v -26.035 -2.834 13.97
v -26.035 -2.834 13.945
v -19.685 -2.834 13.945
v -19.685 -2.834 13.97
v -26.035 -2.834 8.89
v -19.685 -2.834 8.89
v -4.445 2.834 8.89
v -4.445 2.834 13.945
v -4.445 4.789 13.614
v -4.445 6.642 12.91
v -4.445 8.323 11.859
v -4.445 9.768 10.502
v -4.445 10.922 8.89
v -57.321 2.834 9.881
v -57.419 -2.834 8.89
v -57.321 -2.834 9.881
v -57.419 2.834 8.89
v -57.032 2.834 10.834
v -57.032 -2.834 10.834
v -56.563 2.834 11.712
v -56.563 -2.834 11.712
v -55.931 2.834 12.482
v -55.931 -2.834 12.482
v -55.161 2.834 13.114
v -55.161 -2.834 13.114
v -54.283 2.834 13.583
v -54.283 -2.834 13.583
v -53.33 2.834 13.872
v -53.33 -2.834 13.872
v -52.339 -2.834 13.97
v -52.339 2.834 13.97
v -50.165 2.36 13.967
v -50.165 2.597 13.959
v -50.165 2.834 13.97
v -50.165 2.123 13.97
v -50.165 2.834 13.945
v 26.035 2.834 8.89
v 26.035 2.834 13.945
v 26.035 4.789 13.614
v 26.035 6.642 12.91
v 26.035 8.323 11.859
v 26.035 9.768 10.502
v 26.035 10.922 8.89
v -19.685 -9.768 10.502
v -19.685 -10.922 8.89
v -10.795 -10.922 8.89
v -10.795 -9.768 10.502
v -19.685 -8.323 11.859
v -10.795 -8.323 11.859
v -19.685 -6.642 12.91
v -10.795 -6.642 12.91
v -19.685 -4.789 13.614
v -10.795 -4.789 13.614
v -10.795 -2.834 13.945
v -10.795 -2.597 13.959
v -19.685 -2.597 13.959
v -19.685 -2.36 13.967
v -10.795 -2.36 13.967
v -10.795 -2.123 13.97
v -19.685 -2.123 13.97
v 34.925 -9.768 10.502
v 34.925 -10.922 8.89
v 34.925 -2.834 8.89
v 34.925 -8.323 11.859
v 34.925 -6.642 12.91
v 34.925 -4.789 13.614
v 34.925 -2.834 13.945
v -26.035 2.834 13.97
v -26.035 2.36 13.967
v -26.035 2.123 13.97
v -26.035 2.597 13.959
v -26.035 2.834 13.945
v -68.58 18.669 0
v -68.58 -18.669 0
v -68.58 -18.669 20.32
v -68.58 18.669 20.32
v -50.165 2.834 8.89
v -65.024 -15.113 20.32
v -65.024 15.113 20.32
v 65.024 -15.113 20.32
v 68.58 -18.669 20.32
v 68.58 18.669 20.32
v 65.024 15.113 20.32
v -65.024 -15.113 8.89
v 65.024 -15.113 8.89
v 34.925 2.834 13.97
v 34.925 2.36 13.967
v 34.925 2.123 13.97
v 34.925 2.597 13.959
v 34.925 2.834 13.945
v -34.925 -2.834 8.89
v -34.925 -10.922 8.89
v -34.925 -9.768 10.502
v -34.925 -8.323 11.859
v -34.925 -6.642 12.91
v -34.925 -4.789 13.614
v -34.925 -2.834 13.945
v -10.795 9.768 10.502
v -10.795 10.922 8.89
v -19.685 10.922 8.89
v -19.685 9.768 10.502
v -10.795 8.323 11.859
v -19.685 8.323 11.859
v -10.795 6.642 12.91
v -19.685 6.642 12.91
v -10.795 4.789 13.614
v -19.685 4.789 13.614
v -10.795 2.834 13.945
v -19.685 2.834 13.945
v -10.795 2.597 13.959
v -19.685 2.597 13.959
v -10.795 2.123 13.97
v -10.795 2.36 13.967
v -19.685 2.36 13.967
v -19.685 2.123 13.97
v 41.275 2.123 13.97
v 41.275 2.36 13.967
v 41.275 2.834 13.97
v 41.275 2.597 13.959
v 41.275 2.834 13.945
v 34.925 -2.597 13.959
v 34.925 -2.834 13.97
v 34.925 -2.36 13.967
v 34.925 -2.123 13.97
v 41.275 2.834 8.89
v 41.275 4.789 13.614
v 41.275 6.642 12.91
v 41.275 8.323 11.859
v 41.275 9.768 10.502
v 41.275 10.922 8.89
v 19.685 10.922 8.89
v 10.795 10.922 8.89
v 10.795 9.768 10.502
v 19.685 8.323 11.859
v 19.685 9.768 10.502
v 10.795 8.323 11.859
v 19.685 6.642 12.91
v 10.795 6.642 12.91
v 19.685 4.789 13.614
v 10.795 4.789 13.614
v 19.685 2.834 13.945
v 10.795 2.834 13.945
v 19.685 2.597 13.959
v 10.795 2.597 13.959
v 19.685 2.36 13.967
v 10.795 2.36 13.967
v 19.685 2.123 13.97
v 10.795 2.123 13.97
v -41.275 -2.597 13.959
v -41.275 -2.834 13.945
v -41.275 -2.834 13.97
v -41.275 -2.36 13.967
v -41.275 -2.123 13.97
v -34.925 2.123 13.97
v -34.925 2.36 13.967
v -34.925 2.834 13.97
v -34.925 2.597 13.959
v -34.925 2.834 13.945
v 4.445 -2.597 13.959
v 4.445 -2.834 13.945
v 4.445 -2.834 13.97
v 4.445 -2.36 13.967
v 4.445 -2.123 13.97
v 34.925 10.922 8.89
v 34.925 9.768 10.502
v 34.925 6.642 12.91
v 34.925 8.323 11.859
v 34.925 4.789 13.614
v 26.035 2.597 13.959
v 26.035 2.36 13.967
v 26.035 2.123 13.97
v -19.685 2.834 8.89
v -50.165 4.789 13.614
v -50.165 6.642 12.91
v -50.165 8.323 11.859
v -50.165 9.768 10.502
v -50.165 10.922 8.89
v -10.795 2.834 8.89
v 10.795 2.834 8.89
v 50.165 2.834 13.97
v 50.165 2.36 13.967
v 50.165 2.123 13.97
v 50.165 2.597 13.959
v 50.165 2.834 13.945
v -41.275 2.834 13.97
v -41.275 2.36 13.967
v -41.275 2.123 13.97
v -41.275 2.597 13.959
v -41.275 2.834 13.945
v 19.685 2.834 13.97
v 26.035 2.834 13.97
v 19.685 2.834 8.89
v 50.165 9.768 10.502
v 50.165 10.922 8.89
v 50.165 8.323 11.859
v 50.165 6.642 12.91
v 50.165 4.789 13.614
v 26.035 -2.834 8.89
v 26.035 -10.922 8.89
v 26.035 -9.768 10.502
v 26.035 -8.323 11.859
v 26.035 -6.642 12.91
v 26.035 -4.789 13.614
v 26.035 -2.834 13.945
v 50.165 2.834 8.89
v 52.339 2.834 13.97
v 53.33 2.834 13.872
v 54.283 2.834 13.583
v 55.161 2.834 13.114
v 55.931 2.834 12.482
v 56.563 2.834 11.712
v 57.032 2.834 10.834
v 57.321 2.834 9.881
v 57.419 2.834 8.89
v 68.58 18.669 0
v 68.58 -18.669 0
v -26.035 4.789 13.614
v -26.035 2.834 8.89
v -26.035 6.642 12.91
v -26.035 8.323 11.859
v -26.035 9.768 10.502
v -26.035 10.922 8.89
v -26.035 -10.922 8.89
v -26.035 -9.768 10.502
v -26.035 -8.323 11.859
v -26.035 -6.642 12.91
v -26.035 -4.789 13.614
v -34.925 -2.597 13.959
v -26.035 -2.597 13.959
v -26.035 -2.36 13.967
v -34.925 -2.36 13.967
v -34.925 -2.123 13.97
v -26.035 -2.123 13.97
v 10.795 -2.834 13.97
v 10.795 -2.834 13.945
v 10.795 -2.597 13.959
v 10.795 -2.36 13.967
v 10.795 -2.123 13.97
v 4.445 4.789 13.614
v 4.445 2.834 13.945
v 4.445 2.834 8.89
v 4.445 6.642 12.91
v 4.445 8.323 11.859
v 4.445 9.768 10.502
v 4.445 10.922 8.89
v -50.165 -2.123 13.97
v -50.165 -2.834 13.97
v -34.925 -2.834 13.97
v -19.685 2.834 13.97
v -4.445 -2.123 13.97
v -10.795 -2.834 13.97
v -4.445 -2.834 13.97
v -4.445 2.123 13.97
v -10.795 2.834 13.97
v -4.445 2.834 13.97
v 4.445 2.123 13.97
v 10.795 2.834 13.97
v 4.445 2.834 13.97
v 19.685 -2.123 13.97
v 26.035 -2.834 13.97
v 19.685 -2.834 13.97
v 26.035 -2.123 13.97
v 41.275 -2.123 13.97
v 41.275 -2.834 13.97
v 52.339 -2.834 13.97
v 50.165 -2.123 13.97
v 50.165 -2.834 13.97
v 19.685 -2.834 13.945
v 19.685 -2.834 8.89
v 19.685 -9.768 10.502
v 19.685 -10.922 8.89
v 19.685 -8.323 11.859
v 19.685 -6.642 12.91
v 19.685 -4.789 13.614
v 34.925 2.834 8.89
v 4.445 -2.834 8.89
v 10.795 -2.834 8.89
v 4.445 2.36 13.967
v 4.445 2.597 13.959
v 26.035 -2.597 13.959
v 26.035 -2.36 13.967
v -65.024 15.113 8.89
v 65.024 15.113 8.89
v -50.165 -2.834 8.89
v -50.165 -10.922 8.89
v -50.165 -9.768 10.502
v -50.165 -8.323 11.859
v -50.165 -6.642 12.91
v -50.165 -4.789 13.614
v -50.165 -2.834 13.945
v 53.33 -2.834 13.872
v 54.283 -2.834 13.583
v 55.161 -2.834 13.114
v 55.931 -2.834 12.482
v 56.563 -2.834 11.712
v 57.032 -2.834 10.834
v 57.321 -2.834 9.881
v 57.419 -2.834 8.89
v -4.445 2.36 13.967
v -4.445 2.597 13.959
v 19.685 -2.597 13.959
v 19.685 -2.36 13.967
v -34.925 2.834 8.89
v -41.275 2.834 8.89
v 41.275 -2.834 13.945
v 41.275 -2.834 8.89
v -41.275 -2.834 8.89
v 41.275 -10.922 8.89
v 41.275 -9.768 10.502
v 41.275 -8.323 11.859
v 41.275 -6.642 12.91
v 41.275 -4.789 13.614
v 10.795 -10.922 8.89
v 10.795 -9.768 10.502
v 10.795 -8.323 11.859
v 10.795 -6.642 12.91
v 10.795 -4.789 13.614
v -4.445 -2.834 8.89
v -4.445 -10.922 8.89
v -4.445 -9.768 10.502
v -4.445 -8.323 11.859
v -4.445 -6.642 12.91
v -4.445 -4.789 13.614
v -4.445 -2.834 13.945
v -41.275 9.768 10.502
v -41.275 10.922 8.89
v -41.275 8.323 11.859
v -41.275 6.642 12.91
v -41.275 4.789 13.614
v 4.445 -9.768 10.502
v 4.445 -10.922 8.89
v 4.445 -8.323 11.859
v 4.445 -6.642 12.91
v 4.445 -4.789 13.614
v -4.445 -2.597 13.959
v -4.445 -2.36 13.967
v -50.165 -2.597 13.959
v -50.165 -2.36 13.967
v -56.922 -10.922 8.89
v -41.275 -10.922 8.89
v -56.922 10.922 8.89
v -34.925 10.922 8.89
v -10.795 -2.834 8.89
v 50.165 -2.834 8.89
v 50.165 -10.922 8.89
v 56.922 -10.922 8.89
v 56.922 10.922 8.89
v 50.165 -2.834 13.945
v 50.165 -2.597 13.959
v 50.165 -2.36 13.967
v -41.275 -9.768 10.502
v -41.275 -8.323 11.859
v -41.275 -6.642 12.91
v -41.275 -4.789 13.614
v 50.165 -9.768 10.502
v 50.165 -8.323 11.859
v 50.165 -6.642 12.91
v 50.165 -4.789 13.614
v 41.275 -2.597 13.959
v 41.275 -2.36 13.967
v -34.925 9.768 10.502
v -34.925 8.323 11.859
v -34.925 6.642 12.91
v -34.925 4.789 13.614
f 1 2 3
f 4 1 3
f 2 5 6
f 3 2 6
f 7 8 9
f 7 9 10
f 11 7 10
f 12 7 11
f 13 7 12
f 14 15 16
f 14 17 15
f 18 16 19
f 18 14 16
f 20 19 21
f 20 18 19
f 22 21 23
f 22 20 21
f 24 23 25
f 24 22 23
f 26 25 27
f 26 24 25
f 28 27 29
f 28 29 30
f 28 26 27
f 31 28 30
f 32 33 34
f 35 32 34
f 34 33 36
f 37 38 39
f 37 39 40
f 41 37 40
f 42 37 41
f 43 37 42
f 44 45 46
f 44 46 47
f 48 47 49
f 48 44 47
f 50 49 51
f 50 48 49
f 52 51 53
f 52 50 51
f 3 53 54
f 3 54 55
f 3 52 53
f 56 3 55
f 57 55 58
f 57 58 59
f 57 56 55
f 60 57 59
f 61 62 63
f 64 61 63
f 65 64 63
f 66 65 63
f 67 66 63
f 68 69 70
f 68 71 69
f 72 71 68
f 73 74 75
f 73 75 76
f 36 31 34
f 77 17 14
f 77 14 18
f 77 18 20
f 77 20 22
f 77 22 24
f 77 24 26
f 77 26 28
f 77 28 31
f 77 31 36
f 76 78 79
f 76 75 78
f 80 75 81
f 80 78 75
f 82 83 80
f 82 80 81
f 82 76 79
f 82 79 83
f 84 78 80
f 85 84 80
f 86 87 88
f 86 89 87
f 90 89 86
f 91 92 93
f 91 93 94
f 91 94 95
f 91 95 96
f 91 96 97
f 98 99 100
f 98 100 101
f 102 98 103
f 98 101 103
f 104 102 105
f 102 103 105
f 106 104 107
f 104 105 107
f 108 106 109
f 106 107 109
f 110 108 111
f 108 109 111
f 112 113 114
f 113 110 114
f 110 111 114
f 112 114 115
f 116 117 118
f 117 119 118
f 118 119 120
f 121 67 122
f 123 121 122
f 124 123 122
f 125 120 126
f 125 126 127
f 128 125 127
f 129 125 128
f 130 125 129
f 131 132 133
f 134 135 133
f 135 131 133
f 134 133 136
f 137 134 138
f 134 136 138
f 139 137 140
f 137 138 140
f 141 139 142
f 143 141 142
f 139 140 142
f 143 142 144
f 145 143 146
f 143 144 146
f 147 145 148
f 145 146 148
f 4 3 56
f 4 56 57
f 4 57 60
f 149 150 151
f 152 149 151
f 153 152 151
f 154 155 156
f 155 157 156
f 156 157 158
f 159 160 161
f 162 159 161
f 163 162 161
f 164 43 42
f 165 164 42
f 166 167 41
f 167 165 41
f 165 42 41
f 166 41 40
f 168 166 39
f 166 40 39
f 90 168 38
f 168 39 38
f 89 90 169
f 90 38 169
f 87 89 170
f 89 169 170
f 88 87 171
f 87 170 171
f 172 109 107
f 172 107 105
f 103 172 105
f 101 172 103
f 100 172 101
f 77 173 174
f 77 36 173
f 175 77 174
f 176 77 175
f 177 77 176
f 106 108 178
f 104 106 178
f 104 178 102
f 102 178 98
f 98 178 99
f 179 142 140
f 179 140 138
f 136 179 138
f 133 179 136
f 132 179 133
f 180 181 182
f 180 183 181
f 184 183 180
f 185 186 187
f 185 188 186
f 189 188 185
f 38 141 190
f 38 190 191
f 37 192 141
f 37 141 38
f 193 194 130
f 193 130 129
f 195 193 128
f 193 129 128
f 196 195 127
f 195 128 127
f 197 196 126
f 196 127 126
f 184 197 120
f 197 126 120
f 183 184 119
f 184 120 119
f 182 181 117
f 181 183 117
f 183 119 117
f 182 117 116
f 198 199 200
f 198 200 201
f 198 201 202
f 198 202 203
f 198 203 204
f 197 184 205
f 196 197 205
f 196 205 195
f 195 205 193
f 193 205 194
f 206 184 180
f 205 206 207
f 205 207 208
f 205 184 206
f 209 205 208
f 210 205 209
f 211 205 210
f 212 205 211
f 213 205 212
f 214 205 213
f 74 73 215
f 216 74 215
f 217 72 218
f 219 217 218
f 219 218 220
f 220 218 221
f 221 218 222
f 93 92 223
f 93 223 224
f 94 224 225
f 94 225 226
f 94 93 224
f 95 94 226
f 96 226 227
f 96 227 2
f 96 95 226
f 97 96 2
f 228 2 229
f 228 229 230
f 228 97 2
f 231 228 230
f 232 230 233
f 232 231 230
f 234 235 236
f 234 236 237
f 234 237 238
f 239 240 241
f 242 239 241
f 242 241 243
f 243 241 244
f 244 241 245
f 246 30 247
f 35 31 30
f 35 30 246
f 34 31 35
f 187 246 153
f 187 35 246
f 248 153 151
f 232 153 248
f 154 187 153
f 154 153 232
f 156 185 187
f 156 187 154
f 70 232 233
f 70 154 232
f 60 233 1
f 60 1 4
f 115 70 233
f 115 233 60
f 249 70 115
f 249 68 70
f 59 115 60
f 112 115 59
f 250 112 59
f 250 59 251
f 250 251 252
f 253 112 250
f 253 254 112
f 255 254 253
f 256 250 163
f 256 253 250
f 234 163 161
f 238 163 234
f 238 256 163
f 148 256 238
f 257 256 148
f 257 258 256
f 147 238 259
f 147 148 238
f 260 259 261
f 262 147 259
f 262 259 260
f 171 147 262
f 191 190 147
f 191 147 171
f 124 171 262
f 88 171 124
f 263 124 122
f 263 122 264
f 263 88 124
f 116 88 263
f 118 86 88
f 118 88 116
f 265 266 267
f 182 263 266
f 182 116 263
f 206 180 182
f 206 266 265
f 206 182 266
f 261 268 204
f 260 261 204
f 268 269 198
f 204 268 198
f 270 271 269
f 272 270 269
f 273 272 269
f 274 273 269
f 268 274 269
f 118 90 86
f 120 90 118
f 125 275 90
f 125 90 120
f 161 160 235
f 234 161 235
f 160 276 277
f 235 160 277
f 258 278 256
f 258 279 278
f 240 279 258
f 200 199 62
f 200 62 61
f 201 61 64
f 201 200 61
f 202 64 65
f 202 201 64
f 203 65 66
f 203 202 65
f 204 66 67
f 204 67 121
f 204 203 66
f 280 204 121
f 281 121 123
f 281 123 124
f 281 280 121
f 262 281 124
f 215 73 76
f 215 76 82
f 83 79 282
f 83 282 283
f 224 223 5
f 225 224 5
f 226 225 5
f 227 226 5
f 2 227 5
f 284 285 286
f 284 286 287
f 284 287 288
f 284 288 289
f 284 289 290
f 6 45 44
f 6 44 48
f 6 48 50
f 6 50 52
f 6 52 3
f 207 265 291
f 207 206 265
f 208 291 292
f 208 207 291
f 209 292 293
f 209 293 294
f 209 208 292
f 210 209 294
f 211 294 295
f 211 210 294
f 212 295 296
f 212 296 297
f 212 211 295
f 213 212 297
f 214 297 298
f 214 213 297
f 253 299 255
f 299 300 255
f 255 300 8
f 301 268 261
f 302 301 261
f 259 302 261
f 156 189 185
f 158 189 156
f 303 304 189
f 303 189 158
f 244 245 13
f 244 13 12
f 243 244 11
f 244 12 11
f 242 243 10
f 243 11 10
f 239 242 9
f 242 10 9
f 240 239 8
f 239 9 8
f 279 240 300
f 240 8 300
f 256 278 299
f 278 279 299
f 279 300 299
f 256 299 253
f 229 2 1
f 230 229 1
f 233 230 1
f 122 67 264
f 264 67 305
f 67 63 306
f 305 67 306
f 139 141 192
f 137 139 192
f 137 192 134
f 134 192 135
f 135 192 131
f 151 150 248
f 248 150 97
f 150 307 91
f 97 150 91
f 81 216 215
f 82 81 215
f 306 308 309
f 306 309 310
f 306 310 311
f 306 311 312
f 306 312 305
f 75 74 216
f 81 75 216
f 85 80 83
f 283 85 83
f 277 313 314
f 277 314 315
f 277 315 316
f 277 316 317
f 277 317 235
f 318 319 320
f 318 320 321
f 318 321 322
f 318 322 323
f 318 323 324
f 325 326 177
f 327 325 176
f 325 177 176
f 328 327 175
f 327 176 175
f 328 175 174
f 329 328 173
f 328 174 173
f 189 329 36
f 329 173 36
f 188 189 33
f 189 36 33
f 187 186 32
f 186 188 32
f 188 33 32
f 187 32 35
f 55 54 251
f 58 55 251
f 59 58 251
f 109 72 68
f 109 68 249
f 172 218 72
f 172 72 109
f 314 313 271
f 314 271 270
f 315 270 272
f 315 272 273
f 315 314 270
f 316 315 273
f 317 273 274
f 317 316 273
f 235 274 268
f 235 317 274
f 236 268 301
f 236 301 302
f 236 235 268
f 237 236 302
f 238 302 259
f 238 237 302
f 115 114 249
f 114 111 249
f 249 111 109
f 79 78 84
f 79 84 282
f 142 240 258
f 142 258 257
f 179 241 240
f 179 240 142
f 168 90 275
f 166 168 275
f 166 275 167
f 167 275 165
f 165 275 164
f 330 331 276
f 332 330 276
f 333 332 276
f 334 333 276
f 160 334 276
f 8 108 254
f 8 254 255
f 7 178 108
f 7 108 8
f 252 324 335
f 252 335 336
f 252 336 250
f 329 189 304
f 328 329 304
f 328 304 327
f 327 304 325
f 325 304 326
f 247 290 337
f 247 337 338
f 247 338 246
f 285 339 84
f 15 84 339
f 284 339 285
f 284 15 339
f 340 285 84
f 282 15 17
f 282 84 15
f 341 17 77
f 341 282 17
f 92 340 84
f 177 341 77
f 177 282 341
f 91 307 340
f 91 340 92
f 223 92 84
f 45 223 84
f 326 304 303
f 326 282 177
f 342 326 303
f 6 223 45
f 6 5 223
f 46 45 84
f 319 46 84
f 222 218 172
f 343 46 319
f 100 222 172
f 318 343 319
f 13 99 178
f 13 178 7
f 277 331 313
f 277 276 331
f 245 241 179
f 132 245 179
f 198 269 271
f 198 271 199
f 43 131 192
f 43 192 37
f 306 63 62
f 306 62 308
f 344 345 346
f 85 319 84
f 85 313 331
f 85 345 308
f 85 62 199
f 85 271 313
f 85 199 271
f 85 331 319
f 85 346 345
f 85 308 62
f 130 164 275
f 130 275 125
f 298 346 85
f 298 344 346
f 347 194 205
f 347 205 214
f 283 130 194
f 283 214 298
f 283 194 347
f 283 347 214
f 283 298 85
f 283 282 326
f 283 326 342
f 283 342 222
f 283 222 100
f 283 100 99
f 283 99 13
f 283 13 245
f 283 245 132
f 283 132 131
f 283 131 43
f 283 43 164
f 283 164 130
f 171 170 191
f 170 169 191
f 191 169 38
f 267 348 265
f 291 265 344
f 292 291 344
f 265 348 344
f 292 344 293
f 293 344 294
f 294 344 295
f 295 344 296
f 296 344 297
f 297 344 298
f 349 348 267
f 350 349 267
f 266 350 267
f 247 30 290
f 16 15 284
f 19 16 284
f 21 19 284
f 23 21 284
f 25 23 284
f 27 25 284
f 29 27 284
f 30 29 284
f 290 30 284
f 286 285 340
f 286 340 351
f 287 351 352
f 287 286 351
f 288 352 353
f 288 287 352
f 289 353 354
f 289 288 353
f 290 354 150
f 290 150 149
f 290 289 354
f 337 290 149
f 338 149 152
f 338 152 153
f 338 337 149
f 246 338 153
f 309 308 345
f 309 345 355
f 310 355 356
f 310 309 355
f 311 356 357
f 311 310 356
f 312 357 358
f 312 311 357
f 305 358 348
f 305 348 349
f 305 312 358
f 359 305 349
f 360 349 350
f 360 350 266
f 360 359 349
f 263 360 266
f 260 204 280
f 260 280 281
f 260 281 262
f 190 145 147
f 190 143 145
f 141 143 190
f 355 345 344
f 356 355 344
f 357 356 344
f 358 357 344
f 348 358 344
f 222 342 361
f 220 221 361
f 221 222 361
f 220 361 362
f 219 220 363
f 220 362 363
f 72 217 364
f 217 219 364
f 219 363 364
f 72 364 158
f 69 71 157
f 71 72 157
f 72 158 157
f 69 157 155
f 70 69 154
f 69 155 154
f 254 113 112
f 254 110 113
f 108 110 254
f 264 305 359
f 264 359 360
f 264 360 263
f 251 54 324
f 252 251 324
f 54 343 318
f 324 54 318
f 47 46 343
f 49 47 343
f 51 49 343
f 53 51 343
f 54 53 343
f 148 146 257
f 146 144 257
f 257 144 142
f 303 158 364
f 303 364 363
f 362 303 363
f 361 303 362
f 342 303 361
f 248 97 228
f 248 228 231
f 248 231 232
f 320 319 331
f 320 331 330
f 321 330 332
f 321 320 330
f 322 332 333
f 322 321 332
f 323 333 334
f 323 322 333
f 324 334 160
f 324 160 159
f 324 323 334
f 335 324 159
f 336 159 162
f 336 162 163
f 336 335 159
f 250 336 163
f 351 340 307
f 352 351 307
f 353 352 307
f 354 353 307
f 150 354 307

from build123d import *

# Parameters (mm, degrees)
F0_W         = 137.16
F0_H         = 37.338
F1_DEPTH     = 20.32
F2_W         = 130.048
F2_H         = 30.226
F3_DEPTH     = 11.43
F4_W         = 8.89
F4_H         = 21.844
F5_DEPTH     = 5.08
F6_T1_DEPTH  = 30.8870452561
F6_T3_DEPTH  = 52.8840905123
F6_T5_DEPTH  = 52.8840905123
F6_T7_DEPTH  = 52.8840905123
F6_T9_DEPTH  = 52.8840905123
F6_T11_DEPTH = 52.8840905123
F6_T13_DEPTH = 30.8870452561
F7_W         = 7.2538567698
F7_H         = 5.6681656279
F7_W_2       = 6.35
F8_DEPTH     = 5.08
F9_R         = 5.07999


# Not quite as in the source:
# - a fillet or chamfer that OpenCascade refuses, or shapes differently, is made with other operations: its cross-section is extruded or revolved along the edge and cut away or added
# - a fillet or chamfer is up to 0.001 mm smaller than in the source, because OpenCascade refuses the exact size
# - a feature names something its author has since deleted; it is built from what else it names


with BuildPart() as f1:
    # F0 (on Top) → F1 (new body)
    with BuildSketch(Plane.XY):
        Rectangle(F0_W, F0_H)
    extrude(amount=F1_DEPTH)

    # F2 (on face) → F3 (cut)
    with BuildSketch(Plane.XY.offset(20.32)):
        Rectangle(F2_W, F2_H)
    extrude(amount=-F3_DEPTH, mode=Mode.SUBTRACT)

    # F4 (on face) → F5 (join)
    with BuildSketch(Plane.XY.offset(8.89)):
        Rectangle(F4_W, F4_H)
        with Locations((15.24, 0)):
            Rectangle(F4_W, F4_H)
        with Locations((30.48, 0)):
            Rectangle(F4_W, F4_H)
        with Locations((45.72, 0)):
            Rectangle(F4_W, F4_H)
        with Locations((-15.24, 0)):
            Rectangle(F4_W, F4_H)
        with Locations((-30.48, 0)):
            Rectangle(F4_W, F4_H)
        with Locations((-45.72, 0)):
            Rectangle(F4_W, F4_H)
    extrude(amount=F5_DEPTH)

    # F6: fillet of radius 10.16 on 14 edges, made by hand

    # F6_s2 → F6_t1 (cut)
    with BuildSketch(Plane.YZ.offset(-50.165)):
        with BuildLine():
            ThreePointArc((-10.922, 8.89), (-7.2031818975, 12.6088181024), (-2.1231818975, 13.97))
            Line((-2.1231818975, 13.97), (-10.922, 13.97))
            Line((-10.922, 13.97), (-10.922, 8.89))
        make_face()
        with BuildLine():
            ThreePointArc((10.922, 8.89), (7.2031818975, 12.6088181024), (2.1231818975, 13.97))
            Line((2.1231818975, 13.97), (10.922, 13.97))
            Line((10.922, 13.97), (10.922, 8.89))
        make_face()
    extrude(amount=F6_T1_DEPTH, mode=Mode.SUBTRACT)

    # F6_s4 → F6_t3 (cut)
    with BuildSketch(Plane.YZ.offset(-56.9220452561)):
        with BuildLine():
            ThreePointArc((-10.922, 8.89), (-7.2031818975, 12.6088181024), (-2.1231818975, 13.97))
            Line((-2.1231818975, 13.97), (-10.922, 13.97))
            Line((-10.922, 13.97), (-10.922, 8.89))
        make_face()
        with BuildLine():
            ThreePointArc((10.922, 8.89), (7.2031818975, 12.6088181024), (2.1231818975, 13.97))
            Line((2.1231818975, 13.97), (10.922, 13.97))
            Line((10.922, 13.97), (10.922, 8.89))
        make_face()
    extrude(amount=F6_T3_DEPTH, mode=Mode.SUBTRACT)

    # F6_s6 → F6_t5 (cut)
    with BuildSketch(Plane.YZ.offset(-41.6820452561)):
        with BuildLine():
            ThreePointArc((-10.922, 8.89), (-7.2031818975, 12.6088181024), (-2.1231818975, 13.97))
            Line((-2.1231818975, 13.97), (-10.922, 13.97))
            Line((-10.922, 13.97), (-10.922, 8.89))
        make_face()
        with BuildLine():
            ThreePointArc((10.922, 8.89), (7.2031818975, 12.6088181024), (2.1231818975, 13.97))
            Line((2.1231818975, 13.97), (10.922, 13.97))
            Line((10.922, 13.97), (10.922, 8.89))
        make_face()
    extrude(amount=F6_T5_DEPTH, mode=Mode.SUBTRACT)

    # F6_s8 → F6_t7 (cut)
    with BuildSketch(Plane.YZ.offset(-26.4420452561)):
        with BuildLine():
            ThreePointArc((-10.922, 8.89), (-7.2031818975, 12.6088181024), (-2.1231818975, 13.97))
            Line((-2.1231818975, 13.97), (-10.922, 13.97))
            Line((-10.922, 13.97), (-10.922, 8.89))
        make_face()
        with BuildLine():
            ThreePointArc((10.922, 8.89), (7.2031818975, 12.6088181024), (2.1231818975, 13.97))
            Line((2.1231818975, 13.97), (10.922, 13.97))
            Line((10.922, 13.97), (10.922, 8.89))
        make_face()
    extrude(amount=F6_T7_DEPTH, mode=Mode.SUBTRACT)

    # F6_s10 → F6_t9 (cut)
    with BuildSketch(Plane.YZ.offset(-11.2020452561)):
        with BuildLine():
            ThreePointArc((-10.922, 8.89), (-7.2031818975, 12.6088181024), (-2.1231818975, 13.97))
            Line((-2.1231818975, 13.97), (-10.922, 13.97))
            Line((-10.922, 13.97), (-10.922, 8.89))
        make_face()
        with BuildLine():
            ThreePointArc((10.922, 8.89), (7.2031818975, 12.6088181024), (2.1231818975, 13.97))
            Line((2.1231818975, 13.97), (10.922, 13.97))
            Line((10.922, 13.97), (10.922, 8.89))
        make_face()
    extrude(amount=F6_T9_DEPTH, mode=Mode.SUBTRACT)

    # F6_s12 → F6_t11 (cut)
    with BuildSketch(Plane.YZ.offset(4.0379547439)):
        with BuildLine():
            ThreePointArc((-10.922, 8.89), (-7.2031818975, 12.6088181024), (-2.1231818975, 13.97))
            Line((-2.1231818975, 13.97), (-10.922, 13.97))
            Line((-10.922, 13.97), (-10.922, 8.89))
        make_face()
        with BuildLine():
            ThreePointArc((10.922, 8.89), (7.2031818975, 12.6088181024), (2.1231818975, 13.97))
            Line((2.1231818975, 13.97), (10.922, 13.97))
            Line((10.922, 13.97), (10.922, 8.89))
        make_face()
    extrude(amount=F6_T11_DEPTH, mode=Mode.SUBTRACT)

    # F6_s14 → F6_t13 (cut)
    with BuildSketch(Plane.YZ.offset(19.2779547439)):
        with BuildLine():
            ThreePointArc((-10.922, 8.89), (-7.2031818975, 12.6088181024), (-2.1231818975, 13.97))
            Line((-2.1231818975, 13.97), (-10.922, 13.97))
            Line((-10.922, 13.97), (-10.922, 8.89))
        make_face()
        with BuildLine():
            ThreePointArc((10.922, 8.89), (7.2031818975, 12.6088181024), (2.1231818975, 13.97))
            Line((2.1231818975, 13.97), (10.922, 13.97))
            Line((10.922, 13.97), (10.922, 8.89))
        make_face()
    extrude(amount=F6_T13_DEPTH, mode=Mode.SUBTRACT)

    # F7 (on face) → F8 (join)
    with BuildSketch(Plane.XY.offset(8.89)):
        with Locations((-53.7919283849, 0)):
            Rectangle(F7_W, F7_H)
        with Locations((-38.1, 0)):
            Rectangle(F7_W_2, F7_H)
        with Locations((-22.86, 0)):
            Rectangle(F7_W_2, F7_H)
        with Locations((-7.62, 0)):
            Rectangle(F7_W_2, F7_H)
        with Locations((7.62, 0)):
            Rectangle(F7_W_2, F7_H)
        with Locations((22.86, 0)):
            Rectangle(F7_W_2, F7_H)
        with Locations((38.1, 0)):
            Rectangle(F7_W_2, F7_H)
        with Locations((53.7919283849, 0)):
            Rectangle(F7_W, F7_H)
    extrude(amount=F8_DEPTH)

    # F9 (radius 5.08 in the source; OpenCascade refuses exactly that, so slightly less here)
    f9_edges = [f1.edges().sort_by_distance(p)[0] for p in [
        (-57.418857, 0, 13.97),
        (57.418857, 0, 13.97),
    ]]
    fillet(f9_edges, radius=F9_R)


solid = f1.part
